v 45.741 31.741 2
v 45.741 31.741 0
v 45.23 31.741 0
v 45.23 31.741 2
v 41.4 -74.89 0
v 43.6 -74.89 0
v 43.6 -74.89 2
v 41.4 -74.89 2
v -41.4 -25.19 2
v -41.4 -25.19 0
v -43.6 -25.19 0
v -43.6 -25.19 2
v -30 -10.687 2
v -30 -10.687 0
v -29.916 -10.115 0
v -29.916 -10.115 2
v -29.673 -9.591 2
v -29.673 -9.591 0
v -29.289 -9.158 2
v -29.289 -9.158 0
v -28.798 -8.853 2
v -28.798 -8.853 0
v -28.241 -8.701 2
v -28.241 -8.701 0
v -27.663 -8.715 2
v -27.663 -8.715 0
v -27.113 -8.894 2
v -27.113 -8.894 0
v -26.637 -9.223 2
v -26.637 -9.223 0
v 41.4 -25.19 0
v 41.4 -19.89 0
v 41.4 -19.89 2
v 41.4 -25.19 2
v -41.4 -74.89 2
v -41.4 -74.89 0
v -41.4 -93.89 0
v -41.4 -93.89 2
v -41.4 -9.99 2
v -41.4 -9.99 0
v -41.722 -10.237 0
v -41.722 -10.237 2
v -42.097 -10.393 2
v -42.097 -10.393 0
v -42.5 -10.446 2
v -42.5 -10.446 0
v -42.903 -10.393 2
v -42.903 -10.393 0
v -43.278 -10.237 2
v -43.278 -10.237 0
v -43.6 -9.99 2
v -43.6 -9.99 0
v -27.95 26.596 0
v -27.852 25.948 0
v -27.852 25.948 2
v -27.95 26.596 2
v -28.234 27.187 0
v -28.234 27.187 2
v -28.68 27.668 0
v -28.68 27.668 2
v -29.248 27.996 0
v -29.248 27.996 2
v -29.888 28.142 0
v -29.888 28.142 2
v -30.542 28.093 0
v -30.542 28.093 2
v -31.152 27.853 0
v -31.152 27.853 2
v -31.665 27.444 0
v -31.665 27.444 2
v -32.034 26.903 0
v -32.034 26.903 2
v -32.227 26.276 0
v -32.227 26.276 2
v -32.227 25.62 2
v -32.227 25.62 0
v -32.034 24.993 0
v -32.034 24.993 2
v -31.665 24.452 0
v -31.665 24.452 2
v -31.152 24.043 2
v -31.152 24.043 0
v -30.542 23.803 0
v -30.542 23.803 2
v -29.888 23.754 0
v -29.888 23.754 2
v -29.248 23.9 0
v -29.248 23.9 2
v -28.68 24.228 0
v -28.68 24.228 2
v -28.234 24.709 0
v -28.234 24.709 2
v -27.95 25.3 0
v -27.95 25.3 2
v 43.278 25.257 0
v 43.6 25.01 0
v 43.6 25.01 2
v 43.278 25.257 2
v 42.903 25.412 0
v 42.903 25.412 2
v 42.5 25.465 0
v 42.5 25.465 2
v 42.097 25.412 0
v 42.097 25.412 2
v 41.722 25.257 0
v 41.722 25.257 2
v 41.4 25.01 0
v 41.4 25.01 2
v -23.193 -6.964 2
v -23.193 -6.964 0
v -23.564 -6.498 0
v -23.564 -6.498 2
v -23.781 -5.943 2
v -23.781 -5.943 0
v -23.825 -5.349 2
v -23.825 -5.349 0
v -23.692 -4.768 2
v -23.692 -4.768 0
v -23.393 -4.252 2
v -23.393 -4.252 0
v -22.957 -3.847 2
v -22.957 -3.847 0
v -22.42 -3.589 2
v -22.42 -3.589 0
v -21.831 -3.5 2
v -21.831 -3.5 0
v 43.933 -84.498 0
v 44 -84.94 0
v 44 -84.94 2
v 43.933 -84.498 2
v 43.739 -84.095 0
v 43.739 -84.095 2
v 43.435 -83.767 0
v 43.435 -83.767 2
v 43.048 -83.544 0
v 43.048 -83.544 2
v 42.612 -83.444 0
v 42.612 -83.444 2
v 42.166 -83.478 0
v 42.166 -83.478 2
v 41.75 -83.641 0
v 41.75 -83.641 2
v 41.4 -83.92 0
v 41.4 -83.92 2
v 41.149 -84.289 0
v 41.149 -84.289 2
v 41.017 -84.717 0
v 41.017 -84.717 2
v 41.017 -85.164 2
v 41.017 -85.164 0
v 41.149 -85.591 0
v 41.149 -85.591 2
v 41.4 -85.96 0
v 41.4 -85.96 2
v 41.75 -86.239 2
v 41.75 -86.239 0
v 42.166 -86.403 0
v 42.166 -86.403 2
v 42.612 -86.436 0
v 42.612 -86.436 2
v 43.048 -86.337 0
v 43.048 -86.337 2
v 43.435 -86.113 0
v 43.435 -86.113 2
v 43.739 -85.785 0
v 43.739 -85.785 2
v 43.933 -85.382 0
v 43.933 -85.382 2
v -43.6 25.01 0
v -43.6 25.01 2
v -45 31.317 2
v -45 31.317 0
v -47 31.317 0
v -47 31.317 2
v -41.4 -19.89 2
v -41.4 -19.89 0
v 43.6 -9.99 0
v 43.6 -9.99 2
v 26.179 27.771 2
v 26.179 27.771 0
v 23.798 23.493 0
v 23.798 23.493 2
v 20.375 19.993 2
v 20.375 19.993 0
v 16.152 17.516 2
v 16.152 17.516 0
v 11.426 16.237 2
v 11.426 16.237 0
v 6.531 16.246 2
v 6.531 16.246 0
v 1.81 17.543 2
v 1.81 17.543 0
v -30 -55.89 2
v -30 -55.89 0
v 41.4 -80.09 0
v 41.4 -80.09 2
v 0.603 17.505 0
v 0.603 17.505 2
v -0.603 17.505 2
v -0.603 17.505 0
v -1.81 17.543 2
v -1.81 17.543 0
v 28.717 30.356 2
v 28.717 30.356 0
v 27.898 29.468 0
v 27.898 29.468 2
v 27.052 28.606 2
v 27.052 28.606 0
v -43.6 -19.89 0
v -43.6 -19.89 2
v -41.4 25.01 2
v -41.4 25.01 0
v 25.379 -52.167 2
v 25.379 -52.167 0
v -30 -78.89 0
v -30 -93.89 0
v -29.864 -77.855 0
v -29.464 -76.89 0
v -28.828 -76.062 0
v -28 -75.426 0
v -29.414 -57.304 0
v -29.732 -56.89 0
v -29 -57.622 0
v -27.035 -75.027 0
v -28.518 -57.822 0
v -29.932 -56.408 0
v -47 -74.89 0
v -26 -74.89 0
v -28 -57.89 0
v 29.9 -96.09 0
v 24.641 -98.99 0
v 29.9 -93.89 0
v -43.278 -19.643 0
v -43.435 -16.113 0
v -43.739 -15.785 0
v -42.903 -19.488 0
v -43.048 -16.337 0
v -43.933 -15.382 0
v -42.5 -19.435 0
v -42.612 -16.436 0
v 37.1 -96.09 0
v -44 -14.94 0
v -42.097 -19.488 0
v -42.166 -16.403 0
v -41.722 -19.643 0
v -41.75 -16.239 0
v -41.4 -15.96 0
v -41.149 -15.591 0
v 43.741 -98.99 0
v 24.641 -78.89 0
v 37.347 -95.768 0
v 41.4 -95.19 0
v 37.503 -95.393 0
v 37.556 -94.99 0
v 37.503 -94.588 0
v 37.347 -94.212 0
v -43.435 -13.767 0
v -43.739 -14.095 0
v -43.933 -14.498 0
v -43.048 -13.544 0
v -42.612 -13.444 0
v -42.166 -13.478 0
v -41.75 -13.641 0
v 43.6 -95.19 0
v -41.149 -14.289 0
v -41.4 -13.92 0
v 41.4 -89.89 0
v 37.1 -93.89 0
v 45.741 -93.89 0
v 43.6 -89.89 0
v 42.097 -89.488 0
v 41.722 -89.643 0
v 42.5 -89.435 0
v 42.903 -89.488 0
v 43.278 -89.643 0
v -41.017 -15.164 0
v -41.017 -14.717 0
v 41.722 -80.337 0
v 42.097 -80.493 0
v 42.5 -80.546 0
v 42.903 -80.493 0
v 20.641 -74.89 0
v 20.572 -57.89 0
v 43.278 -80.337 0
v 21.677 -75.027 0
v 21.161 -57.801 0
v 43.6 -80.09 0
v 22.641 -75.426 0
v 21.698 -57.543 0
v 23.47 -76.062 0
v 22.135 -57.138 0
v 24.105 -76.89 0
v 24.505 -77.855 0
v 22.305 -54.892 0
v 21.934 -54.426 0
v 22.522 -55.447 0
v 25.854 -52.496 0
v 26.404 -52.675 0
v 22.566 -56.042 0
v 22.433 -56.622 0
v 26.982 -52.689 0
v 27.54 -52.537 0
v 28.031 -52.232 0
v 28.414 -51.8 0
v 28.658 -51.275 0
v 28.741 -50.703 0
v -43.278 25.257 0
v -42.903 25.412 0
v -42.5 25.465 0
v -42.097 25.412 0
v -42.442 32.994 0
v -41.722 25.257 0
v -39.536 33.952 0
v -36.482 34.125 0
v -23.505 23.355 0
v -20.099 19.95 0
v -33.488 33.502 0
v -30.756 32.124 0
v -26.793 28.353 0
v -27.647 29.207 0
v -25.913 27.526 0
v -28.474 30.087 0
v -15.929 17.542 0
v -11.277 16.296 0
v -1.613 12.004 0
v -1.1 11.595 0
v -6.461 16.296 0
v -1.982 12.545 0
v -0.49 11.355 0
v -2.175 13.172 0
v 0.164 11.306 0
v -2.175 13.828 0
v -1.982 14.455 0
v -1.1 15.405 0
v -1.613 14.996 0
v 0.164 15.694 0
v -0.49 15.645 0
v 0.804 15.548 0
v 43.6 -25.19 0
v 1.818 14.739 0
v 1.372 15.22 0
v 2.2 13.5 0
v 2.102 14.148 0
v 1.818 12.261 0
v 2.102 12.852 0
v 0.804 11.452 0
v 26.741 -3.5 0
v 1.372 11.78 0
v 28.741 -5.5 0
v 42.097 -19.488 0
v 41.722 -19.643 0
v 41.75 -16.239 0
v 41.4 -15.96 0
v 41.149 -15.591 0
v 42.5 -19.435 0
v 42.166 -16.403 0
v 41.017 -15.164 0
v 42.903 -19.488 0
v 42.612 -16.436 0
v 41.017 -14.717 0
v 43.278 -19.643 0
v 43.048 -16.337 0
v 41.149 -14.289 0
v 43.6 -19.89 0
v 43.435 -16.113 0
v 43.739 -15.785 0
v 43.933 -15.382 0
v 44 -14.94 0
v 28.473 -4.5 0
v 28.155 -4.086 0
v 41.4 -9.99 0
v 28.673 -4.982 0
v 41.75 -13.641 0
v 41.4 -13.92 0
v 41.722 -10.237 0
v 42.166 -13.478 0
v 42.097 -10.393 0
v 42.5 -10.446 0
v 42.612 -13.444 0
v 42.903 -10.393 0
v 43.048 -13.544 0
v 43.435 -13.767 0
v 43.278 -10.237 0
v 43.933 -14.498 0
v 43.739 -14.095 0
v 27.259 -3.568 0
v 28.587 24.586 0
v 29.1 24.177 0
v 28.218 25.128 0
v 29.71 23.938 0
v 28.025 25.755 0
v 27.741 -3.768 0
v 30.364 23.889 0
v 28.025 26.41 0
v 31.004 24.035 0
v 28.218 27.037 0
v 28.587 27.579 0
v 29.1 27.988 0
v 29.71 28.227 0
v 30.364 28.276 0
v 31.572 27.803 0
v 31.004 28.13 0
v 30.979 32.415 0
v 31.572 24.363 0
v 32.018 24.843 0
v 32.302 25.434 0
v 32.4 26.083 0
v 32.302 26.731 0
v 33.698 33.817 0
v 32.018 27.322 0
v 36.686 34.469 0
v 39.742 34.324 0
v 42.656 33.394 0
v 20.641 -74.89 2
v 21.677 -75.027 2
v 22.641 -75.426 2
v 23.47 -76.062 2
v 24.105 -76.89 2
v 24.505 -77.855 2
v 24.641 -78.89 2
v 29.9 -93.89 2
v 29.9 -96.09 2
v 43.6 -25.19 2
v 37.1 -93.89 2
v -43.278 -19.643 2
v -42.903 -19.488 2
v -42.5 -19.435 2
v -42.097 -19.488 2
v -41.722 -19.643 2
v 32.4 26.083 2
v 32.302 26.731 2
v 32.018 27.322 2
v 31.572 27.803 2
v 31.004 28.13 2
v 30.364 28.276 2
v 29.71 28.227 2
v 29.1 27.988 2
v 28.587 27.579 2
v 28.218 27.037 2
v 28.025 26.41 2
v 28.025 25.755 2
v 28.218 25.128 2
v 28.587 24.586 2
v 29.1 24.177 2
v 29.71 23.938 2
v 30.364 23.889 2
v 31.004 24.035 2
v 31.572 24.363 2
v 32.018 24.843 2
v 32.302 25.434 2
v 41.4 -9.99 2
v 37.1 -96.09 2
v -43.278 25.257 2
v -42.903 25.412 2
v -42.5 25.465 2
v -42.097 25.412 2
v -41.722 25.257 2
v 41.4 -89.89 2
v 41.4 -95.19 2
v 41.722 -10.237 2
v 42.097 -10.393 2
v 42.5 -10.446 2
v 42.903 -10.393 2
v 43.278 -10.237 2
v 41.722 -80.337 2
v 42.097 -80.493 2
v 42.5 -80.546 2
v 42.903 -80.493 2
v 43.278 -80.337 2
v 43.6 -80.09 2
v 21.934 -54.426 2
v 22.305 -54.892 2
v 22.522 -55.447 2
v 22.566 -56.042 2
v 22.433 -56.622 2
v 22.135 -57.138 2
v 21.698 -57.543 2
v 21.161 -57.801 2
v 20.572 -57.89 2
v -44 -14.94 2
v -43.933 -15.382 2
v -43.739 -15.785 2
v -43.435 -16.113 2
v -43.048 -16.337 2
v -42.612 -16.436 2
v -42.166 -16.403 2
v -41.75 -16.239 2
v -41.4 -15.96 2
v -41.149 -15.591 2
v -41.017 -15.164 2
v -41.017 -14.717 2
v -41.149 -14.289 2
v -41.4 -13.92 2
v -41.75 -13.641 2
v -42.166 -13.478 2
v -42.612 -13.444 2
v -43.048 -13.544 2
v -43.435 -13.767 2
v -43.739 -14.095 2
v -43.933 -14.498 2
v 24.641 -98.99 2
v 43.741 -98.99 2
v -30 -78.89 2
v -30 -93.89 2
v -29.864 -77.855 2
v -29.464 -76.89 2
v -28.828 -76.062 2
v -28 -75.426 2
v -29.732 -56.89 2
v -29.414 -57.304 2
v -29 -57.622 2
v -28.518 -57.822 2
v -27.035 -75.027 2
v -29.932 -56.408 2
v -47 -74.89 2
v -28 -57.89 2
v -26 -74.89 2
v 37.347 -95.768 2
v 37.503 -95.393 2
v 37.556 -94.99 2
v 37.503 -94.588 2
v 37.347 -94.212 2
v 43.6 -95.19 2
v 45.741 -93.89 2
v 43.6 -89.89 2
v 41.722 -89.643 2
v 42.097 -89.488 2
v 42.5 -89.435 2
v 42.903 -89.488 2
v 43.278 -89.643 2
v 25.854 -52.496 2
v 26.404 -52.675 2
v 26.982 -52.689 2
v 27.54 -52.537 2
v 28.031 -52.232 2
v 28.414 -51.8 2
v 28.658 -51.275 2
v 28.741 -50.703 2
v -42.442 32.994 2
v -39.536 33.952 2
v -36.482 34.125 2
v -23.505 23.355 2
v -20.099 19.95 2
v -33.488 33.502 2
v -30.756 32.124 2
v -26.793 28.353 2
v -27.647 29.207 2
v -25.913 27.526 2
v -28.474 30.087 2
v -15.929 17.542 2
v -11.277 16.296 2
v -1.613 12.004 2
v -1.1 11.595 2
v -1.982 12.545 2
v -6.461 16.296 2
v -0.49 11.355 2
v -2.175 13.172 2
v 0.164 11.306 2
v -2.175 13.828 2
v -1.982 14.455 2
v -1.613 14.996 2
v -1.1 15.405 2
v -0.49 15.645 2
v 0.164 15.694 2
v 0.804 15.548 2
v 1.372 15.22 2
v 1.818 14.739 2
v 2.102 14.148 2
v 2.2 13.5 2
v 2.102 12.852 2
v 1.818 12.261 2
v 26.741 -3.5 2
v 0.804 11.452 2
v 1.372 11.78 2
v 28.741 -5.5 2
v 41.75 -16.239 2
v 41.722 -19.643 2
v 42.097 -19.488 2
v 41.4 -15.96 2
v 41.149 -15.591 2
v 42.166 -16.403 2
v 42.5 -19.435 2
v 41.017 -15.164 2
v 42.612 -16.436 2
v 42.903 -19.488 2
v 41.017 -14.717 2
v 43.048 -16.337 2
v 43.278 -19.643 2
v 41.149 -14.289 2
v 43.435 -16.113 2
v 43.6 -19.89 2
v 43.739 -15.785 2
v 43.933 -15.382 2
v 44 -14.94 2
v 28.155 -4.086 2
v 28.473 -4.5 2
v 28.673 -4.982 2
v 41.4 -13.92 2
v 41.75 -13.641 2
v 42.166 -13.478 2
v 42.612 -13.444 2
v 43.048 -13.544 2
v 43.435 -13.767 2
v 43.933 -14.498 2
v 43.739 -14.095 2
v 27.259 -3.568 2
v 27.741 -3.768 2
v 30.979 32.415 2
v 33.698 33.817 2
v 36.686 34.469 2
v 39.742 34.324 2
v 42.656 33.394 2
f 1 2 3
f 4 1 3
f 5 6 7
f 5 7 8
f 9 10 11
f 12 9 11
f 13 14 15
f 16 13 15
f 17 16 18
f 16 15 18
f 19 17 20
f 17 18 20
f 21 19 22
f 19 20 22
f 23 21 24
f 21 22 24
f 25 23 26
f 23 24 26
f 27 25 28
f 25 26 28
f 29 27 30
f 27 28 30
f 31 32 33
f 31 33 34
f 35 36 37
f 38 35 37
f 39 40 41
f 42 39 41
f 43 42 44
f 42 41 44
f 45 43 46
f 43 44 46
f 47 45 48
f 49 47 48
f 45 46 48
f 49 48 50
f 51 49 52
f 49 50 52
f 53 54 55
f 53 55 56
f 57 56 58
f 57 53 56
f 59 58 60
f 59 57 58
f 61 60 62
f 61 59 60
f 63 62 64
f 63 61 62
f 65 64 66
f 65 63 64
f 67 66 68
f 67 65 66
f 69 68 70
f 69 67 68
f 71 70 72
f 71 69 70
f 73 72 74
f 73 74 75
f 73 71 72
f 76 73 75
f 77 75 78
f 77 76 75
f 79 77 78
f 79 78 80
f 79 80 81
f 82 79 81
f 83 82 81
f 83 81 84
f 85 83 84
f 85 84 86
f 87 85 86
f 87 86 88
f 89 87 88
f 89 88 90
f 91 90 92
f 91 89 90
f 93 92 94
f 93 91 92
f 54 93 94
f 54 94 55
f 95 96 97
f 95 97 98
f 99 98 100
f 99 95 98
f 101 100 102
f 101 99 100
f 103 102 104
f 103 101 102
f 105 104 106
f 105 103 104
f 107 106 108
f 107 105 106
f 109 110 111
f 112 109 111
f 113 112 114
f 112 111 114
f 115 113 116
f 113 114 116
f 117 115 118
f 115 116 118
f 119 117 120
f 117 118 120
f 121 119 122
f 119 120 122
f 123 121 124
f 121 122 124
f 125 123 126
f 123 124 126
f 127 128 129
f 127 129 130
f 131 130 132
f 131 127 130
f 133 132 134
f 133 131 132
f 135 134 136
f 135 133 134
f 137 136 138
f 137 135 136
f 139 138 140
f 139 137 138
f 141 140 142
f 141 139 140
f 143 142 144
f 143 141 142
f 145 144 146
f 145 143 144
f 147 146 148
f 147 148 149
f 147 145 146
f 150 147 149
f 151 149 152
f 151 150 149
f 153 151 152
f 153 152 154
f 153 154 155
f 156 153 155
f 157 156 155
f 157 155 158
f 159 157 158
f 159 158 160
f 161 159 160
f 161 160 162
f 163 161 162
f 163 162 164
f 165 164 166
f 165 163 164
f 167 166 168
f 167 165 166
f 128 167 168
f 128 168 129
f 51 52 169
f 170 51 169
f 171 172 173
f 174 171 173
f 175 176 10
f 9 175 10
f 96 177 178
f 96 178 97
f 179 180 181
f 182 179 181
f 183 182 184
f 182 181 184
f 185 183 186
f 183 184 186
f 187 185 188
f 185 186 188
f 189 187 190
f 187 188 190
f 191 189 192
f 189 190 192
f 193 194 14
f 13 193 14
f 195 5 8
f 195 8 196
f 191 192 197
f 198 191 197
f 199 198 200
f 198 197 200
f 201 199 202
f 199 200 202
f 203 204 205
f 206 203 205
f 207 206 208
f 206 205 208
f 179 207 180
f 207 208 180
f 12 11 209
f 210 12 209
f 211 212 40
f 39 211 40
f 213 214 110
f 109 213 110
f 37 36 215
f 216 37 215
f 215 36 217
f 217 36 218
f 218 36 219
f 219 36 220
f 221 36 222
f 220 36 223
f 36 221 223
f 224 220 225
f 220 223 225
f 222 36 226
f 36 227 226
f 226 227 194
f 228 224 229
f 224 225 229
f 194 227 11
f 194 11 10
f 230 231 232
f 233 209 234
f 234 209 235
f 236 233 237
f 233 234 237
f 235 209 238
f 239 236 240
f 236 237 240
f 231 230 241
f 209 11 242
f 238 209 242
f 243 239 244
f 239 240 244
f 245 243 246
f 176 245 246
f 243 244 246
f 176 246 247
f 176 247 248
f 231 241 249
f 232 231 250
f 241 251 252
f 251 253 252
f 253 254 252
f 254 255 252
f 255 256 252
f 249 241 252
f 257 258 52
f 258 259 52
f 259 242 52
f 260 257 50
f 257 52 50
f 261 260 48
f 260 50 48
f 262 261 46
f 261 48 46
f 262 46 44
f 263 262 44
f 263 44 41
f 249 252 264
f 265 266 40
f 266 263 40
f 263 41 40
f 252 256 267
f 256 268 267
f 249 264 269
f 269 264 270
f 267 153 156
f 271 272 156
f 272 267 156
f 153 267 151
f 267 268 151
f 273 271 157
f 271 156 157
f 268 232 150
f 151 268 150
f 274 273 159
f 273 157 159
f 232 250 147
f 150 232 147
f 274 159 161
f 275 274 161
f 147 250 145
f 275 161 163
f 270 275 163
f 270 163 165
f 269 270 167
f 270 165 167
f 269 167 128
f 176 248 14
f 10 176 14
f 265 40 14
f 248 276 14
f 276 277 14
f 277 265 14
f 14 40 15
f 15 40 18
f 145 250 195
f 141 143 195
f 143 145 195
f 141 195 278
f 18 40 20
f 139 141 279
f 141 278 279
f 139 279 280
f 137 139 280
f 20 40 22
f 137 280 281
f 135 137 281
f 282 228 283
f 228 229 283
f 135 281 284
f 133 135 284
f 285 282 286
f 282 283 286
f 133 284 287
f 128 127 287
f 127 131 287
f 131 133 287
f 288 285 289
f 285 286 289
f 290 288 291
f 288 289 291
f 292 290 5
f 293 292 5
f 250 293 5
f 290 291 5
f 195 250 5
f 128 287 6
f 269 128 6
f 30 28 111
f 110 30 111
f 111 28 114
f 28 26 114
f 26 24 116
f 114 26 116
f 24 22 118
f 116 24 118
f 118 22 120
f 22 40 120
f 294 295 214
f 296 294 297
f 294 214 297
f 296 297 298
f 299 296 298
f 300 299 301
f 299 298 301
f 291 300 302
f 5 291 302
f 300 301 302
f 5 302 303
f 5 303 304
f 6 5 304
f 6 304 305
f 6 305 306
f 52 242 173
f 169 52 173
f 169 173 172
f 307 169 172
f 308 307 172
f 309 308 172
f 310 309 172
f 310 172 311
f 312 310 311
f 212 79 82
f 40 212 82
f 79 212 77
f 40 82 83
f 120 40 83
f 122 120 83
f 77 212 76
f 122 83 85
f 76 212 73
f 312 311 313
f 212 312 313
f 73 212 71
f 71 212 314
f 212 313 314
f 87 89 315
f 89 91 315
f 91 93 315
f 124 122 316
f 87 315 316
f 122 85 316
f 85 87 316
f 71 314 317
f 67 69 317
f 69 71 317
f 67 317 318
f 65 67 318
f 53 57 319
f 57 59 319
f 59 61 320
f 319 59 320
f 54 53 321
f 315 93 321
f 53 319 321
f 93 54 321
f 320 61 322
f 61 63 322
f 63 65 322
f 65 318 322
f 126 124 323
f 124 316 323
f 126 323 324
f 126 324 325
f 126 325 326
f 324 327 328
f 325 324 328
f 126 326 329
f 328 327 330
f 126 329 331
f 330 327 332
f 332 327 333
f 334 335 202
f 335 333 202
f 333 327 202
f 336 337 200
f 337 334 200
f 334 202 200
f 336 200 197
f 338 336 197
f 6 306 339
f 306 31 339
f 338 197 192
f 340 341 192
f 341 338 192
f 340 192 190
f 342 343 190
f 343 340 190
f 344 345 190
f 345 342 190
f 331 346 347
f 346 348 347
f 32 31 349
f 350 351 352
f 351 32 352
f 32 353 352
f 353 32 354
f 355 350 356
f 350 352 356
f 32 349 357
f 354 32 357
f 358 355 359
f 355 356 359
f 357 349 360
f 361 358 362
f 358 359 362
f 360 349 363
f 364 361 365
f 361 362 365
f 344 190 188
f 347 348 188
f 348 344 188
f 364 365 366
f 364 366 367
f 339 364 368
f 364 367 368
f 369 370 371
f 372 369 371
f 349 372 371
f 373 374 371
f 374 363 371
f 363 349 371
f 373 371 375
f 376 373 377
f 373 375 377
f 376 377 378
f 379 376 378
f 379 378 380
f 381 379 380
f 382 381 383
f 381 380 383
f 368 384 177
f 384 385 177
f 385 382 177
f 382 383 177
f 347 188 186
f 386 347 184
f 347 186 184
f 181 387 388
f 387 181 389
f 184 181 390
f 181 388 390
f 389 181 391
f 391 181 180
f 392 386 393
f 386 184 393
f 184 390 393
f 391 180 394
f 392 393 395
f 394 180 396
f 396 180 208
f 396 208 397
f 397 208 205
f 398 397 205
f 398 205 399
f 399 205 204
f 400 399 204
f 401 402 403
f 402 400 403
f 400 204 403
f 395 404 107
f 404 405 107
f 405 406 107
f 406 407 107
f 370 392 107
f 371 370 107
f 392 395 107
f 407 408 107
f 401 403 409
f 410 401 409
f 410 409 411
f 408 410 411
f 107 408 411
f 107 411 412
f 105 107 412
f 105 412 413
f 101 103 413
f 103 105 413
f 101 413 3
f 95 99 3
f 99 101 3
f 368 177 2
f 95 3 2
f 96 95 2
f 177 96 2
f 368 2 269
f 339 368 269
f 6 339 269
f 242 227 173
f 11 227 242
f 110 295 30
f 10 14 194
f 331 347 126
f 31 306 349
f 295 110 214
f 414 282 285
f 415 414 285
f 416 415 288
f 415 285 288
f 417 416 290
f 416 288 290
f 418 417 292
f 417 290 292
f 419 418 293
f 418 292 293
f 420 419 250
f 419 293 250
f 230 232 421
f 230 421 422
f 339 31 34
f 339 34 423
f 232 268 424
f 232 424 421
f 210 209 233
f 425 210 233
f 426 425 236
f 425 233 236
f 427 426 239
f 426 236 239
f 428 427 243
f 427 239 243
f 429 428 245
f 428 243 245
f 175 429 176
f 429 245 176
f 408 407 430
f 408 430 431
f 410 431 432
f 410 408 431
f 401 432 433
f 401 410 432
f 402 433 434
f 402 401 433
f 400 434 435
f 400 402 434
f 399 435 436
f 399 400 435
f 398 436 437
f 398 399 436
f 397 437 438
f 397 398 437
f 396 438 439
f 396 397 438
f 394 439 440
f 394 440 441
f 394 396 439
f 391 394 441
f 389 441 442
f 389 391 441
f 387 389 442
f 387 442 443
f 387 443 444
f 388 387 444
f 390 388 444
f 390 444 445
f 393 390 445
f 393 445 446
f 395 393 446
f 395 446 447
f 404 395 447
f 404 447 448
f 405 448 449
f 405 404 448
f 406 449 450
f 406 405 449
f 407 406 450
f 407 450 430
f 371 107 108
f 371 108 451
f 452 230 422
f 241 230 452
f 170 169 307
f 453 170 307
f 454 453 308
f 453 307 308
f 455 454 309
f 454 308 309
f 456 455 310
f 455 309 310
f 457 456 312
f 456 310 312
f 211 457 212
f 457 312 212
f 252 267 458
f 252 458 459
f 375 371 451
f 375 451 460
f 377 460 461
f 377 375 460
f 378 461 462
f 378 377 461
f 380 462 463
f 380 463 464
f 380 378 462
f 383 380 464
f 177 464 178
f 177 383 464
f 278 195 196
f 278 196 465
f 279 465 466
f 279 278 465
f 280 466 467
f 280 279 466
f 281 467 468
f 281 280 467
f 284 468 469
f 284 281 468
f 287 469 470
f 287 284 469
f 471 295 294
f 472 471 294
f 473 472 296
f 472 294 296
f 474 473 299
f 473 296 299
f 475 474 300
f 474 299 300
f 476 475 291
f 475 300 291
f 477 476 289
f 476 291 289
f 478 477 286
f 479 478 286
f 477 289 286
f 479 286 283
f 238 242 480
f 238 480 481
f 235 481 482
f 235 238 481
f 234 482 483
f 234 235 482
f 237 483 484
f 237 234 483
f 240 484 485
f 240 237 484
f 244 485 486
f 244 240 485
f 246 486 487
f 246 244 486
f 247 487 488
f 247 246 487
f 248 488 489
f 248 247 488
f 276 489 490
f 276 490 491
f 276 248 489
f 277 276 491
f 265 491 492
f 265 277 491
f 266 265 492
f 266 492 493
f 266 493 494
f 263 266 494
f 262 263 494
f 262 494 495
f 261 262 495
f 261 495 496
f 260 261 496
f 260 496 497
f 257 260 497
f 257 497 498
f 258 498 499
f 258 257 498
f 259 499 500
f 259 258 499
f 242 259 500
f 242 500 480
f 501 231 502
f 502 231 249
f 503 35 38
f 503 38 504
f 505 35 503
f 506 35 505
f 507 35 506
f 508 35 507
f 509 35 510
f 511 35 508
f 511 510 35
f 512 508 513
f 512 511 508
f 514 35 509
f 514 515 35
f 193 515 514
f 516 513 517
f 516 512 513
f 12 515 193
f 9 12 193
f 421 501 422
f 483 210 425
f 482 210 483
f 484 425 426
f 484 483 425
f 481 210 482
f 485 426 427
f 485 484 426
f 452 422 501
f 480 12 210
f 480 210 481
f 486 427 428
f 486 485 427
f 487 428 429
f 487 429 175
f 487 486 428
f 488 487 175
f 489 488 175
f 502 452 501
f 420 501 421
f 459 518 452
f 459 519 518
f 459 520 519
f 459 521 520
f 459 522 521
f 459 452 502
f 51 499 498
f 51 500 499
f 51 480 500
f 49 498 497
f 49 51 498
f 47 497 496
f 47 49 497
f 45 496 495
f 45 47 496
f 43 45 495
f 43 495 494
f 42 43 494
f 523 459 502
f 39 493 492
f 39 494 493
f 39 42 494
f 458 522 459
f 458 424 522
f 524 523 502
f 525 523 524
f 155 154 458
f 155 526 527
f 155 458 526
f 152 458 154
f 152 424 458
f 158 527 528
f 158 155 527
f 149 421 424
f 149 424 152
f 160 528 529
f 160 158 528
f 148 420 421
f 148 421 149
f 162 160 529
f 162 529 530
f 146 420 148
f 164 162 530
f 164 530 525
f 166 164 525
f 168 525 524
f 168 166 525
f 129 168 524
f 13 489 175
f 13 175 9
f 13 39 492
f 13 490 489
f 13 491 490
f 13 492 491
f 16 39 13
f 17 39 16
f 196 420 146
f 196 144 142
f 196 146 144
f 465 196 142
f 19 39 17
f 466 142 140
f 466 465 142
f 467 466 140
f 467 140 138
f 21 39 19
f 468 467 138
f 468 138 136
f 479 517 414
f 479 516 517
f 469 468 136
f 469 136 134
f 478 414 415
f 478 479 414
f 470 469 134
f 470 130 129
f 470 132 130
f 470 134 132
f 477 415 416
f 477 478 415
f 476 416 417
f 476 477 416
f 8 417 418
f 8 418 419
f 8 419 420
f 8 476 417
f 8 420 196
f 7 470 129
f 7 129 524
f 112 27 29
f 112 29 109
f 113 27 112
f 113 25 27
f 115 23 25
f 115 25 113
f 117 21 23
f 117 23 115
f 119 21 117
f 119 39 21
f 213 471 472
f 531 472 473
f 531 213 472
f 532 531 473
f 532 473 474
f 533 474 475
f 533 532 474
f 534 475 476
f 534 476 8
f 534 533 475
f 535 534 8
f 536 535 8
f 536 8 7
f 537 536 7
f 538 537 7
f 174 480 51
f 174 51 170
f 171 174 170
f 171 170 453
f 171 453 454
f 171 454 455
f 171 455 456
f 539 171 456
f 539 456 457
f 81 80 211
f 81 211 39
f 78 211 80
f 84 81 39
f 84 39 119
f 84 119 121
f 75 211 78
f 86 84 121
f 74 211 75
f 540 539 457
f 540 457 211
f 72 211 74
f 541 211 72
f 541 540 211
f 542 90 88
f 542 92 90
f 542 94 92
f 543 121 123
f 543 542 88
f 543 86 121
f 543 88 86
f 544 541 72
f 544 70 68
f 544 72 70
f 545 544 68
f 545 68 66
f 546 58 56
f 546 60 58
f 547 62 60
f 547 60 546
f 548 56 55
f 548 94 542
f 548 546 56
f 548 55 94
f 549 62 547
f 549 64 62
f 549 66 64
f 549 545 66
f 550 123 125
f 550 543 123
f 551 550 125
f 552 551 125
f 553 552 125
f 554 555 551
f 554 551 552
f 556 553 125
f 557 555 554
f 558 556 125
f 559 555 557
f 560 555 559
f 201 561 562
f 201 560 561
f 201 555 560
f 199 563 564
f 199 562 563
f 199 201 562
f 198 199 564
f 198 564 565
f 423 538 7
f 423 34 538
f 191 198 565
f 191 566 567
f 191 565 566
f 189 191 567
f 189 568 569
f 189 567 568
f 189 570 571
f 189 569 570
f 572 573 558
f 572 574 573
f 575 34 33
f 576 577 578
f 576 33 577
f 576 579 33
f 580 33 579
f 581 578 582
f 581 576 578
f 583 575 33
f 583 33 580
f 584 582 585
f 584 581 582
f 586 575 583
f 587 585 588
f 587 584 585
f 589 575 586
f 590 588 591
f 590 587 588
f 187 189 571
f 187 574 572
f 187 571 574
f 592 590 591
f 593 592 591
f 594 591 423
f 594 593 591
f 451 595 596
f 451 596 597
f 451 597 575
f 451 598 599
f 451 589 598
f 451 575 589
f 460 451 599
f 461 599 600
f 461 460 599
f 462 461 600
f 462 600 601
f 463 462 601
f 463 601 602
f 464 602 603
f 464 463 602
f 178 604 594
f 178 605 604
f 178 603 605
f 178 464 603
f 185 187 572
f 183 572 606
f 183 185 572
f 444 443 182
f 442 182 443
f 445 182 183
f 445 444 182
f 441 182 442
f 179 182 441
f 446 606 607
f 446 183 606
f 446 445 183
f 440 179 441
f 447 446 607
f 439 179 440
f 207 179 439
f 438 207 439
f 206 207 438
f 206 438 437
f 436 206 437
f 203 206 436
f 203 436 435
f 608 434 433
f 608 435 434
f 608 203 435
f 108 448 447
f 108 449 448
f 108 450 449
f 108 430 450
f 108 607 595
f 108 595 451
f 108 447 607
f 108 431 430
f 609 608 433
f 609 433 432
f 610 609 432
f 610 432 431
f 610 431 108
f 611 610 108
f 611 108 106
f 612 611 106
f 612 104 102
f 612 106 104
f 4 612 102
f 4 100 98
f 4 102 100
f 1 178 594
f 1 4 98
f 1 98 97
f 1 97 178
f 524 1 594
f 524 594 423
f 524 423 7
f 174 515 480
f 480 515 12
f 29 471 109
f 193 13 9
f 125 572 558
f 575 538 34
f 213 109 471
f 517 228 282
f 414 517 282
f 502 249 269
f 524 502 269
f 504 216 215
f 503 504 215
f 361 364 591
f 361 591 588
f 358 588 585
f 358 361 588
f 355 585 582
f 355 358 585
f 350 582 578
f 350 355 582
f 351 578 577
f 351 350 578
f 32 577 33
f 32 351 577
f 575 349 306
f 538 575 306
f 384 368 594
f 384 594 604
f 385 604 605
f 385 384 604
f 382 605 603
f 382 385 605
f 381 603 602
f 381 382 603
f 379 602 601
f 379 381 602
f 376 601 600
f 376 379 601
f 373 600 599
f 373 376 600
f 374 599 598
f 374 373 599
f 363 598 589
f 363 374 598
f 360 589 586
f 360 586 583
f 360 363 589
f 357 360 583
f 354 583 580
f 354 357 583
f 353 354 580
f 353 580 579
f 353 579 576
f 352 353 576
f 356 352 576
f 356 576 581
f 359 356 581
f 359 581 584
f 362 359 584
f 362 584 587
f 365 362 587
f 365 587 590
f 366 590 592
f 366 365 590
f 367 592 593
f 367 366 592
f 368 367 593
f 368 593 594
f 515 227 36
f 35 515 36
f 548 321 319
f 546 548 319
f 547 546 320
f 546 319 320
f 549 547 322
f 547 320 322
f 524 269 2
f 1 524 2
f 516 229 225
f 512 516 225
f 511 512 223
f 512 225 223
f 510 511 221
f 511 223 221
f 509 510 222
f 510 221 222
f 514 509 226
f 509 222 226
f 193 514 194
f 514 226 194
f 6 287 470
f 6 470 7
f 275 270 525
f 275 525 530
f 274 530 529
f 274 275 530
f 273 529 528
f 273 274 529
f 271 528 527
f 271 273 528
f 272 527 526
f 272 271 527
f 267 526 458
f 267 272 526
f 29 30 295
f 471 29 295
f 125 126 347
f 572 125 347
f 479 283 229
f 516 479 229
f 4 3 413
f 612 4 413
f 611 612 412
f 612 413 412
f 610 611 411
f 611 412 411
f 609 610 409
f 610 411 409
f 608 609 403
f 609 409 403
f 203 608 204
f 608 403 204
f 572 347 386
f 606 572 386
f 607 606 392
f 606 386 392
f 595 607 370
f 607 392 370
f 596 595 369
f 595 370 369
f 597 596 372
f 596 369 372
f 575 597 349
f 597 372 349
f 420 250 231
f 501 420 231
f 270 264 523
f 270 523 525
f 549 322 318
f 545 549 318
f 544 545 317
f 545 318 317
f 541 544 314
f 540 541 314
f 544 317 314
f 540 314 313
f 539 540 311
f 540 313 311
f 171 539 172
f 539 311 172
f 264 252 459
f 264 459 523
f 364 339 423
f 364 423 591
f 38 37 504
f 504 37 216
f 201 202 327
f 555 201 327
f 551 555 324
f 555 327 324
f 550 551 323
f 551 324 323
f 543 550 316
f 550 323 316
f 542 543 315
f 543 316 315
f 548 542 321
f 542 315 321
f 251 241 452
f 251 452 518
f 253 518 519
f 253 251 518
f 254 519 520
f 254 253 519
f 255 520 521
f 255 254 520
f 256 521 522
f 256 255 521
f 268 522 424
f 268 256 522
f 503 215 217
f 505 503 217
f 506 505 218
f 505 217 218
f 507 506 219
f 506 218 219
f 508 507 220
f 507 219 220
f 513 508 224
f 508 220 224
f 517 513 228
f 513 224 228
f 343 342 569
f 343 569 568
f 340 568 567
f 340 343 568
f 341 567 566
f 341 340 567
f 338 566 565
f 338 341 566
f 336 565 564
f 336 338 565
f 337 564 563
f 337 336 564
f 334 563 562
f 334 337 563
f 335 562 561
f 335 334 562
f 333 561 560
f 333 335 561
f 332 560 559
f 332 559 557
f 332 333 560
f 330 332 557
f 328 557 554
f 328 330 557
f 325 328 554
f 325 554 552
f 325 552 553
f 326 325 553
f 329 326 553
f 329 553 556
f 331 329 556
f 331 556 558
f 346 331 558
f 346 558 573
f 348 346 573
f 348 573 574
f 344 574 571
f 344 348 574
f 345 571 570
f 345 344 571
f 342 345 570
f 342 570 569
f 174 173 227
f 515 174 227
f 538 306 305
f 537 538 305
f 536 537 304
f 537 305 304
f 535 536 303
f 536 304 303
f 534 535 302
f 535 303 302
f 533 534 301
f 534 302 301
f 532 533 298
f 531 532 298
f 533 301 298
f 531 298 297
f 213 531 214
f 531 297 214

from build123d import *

# Parameters (mm, degrees)
SKETCH_3_R      = 2.2
SKETCH_3_R_2    = 1.5
EXTRUDE_1_DEPTH = 2


with BuildPart() as part:
    # 草图3 → 凸台-拉伸1 (new body)
    with BuildSketch(Plane.XY):
        with BuildLine():
            Line((-41.4, -74.890216685), (-41.4, -93.890216685))
            Line((-41.4, -93.890216685), (-30, -93.890216685))
            Line((-30, -93.890216685), (-30, -78.890216685))
            ThreePointArc((-30, -78.890216685), (-28.828427125, -76.061789561), (-26, -74.890216685))
            Line((-26, -74.890216685), (20.641271636, -74.890216685))
            ThreePointArc((20.641271636, -74.890216685), (23.469698761, -76.061789561), (24.641271636, -78.890216685))
            Line((24.641271636, -78.890216685), (24.641271636, -93.890216685))
            Line((24.641271636, -93.890216685), (24.641271636, -97.990216685))
            Line((24.641271636, -97.990216685), (24.641271636, -98.990216685))
            Line((24.641271636, -98.990216685), (43.741271636, -98.990216685))
            Line((43.741271636, -98.990216685), (45.741271636, -93.890216685))
            Line((45.741271636, -93.890216685), (45.741271636, 31.741152315))
            Line((45.741271636, 31.741152315), (45.230037269, 31.741152315))
            ThreePointArc((45.230037269, 31.741152315), (36.686440181, 34.468680322), (28.716551195, 30.356098435))
            ThreePointArc((28.716551195, 30.356098435), (27.478316584, 29.033500084), (26.179230338, 27.770619934))
            ThreePointArc((26.179230338, 27.770619934), (16.152230905, 17.515551518), (1.809761925, 17.542559084))
            ThreePointArc((1.809761925, 17.542559084), (0, 17.5), (-1.809761925, 17.542559084))
            ThreePointArc((-1.809761925, 17.542559084), (-15.928828372, 17.542283516), (-25.912710857, 27.525776288))
            ThreePointArc((-25.912710857, 27.525776288), (-27.223611076, 28.776388924), (-28.474223712, 30.087289143))
            ThreePointArc((-28.474223712, 30.087289143), (-36.482419799, 34.124770496), (-45, 31.317051182))
            Line((-45, 31.317051182), (-47, 31.317051182))
            Line((-47, 31.317051182), (-47, -74.890216685))
            Line((-47, -74.890216685), (-41.4, -74.890216685))
        make_face()
        with Locations((0, 13.5)):
            Circle(SKETCH_3_R, mode=Mode.SUBTRACT)
        with Locations((-30.052038202, 25.947961669)):
            Circle(SKETCH_3_R, mode=Mode.SUBTRACT)
        with Locations((30.199957913, 26.082571452)):
            Circle(SKETCH_3_R, mode=Mode.SUBTRACT)
        with Locations((42.5, -14.940216685)):
            Circle(SKETCH_3_R_2, mode=Mode.SUBTRACT)
        with Locations(Location((-42.5, -14.940216685, 0), (0, 0, 180))):
            Circle(SKETCH_3_R_2, mode=Mode.SUBTRACT)
        with Locations((42.5, -84.940216685)):
            Circle(SKETCH_3_R_2, mode=Mode.SUBTRACT)
        with BuildLine():
            Line((-43.6, -9.990216685), (-43.6, 25.009783315))
            ThreePointArc((-43.6, 25.009783315), (-42.5, 25.465418233), (-41.4, 25.009783315))
            Line((-41.4, 25.009783315), (-41.4, -9.990216685))
            ThreePointArc((-41.4, -9.990216685), (-42.5, -10.445851604), (-43.6, -9.990216685))
        make_face(mode=Mode.SUBTRACT)
        with BuildLine():
            Line((-41.4, -19.890216685), (-41.4, -25.190216685))
            Line((-41.4, -25.190216685), (-43.6, -25.190216685))
            Line((-43.6, -25.190216685), (-43.6, -19.890216685))
            ThreePointArc((-43.6, -19.890216685), (-42.5, -19.434581767), (-41.4, -19.890216685))
        make_face(mode=Mode.SUBTRACT)
        with BuildLine():
            Line((37.1, -93.890216685), (29.9, -93.890216685))
            Line((29.9, -93.890216685), (29.9, -96.090216685))
            Line((29.9, -96.090216685), (37.1, -96.090216685))
            ThreePointArc((37.1, -96.090216685), (37.555634919, -94.990216685), (37.1, -93.890216685))
        make_face(mode=Mode.SUBTRACT)
        with BuildLine():
            Line((43.6, -25.190216685), (43.6, -19.890216685))
            ThreePointArc((43.6, -19.890216685), (42.5, -19.434581767), (41.4, -19.890216685))
            Line((41.4, -19.890216685), (41.4, -25.190216685))
            Line((41.4, -25.190216685), (43.6, -25.190216685))
        make_face(mode=Mode.SUBTRACT)
        with BuildLine():
            Line((43.6, -95.190216685), (43.6, -89.890216685))
            ThreePointArc((43.6, -89.890216685), (42.5, -89.434581767), (41.4, -89.890216685))
            Line((41.4, -89.890216685), (41.4, -95.190216685))
            Line((41.4, -95.190216685), (43.6, -95.190216685))
        make_face(mode=Mode.SUBTRACT)
        with BuildLine():
            Line((41.4, -74.890216685), (41.4, -80.090216685))
            ThreePointArc((41.4, -80.090216685), (42.5, -80.545851604), (43.6, -80.090216685))
            Line((43.6, -80.090216685), (43.6, -74.890216685))
            Line((43.6, -74.890216685), (41.4, -74.890216685))
        make_face(mode=Mode.SUBTRACT)
        with BuildLine():
            Line((41.4, 25.009783315), (41.4, -9.990216685))
            ThreePointArc((41.4, -9.990216685), (42.5, -10.445851604), (43.6, -9.990216685))
            Line((43.6, -9.990216685), (43.6, 25.009783315))
            ThreePointArc((43.6, 25.009783315), (42.5, 25.465418233), (41.4, 25.009783315))
        make_face(mode=Mode.SUBTRACT)
        with BuildLine():
            Line((-21.830528741, -3.5), (26.741271636, -3.5))
            ThreePointArc((26.741271636, -3.5), (28.155485198, -4.085786438), (28.741271636, -5.5))
            Line((28.741271636, -5.5), (28.741271636, -50.70338646))
            ThreePointArc((28.741271636, -50.70338646), (27.539684971, -52.537108399), (25.378735489, -52.167454508))
            Line((25.378735489, -52.167454508), (-23.193064888, -6.964068047))
            ThreePointArc((-23.193064888, -6.964068047), (-23.691729441, -4.767926266), (-21.830528741, -3.5))
        make_face(mode=Mode.SUBTRACT)
        with BuildLine():
            Line((-26.637463853, -9.222762177), (21.934336524, -54.426148638))
            ThreePointArc((21.934336524, -54.426148638), (22.433001077, -56.62229042), (20.571800377, -57.890216685))
            Line((20.571800377, -57.890216685), (-28, -57.890216685))
            ThreePointArc((-28, -57.890216685), (-29.414213562, -57.304430248), (-30, -55.890216685))
            Line((-30, -55.890216685), (-30, -10.686830225))
            ThreePointArc((-30, -10.686830225), (-28.798413335, -8.853108286), (-26.637463853, -9.222762177))
        make_face(mode=Mode.SUBTRACT)
    extrude(amount=EXTRUDE_1_DEPTH)


solid = part.part
